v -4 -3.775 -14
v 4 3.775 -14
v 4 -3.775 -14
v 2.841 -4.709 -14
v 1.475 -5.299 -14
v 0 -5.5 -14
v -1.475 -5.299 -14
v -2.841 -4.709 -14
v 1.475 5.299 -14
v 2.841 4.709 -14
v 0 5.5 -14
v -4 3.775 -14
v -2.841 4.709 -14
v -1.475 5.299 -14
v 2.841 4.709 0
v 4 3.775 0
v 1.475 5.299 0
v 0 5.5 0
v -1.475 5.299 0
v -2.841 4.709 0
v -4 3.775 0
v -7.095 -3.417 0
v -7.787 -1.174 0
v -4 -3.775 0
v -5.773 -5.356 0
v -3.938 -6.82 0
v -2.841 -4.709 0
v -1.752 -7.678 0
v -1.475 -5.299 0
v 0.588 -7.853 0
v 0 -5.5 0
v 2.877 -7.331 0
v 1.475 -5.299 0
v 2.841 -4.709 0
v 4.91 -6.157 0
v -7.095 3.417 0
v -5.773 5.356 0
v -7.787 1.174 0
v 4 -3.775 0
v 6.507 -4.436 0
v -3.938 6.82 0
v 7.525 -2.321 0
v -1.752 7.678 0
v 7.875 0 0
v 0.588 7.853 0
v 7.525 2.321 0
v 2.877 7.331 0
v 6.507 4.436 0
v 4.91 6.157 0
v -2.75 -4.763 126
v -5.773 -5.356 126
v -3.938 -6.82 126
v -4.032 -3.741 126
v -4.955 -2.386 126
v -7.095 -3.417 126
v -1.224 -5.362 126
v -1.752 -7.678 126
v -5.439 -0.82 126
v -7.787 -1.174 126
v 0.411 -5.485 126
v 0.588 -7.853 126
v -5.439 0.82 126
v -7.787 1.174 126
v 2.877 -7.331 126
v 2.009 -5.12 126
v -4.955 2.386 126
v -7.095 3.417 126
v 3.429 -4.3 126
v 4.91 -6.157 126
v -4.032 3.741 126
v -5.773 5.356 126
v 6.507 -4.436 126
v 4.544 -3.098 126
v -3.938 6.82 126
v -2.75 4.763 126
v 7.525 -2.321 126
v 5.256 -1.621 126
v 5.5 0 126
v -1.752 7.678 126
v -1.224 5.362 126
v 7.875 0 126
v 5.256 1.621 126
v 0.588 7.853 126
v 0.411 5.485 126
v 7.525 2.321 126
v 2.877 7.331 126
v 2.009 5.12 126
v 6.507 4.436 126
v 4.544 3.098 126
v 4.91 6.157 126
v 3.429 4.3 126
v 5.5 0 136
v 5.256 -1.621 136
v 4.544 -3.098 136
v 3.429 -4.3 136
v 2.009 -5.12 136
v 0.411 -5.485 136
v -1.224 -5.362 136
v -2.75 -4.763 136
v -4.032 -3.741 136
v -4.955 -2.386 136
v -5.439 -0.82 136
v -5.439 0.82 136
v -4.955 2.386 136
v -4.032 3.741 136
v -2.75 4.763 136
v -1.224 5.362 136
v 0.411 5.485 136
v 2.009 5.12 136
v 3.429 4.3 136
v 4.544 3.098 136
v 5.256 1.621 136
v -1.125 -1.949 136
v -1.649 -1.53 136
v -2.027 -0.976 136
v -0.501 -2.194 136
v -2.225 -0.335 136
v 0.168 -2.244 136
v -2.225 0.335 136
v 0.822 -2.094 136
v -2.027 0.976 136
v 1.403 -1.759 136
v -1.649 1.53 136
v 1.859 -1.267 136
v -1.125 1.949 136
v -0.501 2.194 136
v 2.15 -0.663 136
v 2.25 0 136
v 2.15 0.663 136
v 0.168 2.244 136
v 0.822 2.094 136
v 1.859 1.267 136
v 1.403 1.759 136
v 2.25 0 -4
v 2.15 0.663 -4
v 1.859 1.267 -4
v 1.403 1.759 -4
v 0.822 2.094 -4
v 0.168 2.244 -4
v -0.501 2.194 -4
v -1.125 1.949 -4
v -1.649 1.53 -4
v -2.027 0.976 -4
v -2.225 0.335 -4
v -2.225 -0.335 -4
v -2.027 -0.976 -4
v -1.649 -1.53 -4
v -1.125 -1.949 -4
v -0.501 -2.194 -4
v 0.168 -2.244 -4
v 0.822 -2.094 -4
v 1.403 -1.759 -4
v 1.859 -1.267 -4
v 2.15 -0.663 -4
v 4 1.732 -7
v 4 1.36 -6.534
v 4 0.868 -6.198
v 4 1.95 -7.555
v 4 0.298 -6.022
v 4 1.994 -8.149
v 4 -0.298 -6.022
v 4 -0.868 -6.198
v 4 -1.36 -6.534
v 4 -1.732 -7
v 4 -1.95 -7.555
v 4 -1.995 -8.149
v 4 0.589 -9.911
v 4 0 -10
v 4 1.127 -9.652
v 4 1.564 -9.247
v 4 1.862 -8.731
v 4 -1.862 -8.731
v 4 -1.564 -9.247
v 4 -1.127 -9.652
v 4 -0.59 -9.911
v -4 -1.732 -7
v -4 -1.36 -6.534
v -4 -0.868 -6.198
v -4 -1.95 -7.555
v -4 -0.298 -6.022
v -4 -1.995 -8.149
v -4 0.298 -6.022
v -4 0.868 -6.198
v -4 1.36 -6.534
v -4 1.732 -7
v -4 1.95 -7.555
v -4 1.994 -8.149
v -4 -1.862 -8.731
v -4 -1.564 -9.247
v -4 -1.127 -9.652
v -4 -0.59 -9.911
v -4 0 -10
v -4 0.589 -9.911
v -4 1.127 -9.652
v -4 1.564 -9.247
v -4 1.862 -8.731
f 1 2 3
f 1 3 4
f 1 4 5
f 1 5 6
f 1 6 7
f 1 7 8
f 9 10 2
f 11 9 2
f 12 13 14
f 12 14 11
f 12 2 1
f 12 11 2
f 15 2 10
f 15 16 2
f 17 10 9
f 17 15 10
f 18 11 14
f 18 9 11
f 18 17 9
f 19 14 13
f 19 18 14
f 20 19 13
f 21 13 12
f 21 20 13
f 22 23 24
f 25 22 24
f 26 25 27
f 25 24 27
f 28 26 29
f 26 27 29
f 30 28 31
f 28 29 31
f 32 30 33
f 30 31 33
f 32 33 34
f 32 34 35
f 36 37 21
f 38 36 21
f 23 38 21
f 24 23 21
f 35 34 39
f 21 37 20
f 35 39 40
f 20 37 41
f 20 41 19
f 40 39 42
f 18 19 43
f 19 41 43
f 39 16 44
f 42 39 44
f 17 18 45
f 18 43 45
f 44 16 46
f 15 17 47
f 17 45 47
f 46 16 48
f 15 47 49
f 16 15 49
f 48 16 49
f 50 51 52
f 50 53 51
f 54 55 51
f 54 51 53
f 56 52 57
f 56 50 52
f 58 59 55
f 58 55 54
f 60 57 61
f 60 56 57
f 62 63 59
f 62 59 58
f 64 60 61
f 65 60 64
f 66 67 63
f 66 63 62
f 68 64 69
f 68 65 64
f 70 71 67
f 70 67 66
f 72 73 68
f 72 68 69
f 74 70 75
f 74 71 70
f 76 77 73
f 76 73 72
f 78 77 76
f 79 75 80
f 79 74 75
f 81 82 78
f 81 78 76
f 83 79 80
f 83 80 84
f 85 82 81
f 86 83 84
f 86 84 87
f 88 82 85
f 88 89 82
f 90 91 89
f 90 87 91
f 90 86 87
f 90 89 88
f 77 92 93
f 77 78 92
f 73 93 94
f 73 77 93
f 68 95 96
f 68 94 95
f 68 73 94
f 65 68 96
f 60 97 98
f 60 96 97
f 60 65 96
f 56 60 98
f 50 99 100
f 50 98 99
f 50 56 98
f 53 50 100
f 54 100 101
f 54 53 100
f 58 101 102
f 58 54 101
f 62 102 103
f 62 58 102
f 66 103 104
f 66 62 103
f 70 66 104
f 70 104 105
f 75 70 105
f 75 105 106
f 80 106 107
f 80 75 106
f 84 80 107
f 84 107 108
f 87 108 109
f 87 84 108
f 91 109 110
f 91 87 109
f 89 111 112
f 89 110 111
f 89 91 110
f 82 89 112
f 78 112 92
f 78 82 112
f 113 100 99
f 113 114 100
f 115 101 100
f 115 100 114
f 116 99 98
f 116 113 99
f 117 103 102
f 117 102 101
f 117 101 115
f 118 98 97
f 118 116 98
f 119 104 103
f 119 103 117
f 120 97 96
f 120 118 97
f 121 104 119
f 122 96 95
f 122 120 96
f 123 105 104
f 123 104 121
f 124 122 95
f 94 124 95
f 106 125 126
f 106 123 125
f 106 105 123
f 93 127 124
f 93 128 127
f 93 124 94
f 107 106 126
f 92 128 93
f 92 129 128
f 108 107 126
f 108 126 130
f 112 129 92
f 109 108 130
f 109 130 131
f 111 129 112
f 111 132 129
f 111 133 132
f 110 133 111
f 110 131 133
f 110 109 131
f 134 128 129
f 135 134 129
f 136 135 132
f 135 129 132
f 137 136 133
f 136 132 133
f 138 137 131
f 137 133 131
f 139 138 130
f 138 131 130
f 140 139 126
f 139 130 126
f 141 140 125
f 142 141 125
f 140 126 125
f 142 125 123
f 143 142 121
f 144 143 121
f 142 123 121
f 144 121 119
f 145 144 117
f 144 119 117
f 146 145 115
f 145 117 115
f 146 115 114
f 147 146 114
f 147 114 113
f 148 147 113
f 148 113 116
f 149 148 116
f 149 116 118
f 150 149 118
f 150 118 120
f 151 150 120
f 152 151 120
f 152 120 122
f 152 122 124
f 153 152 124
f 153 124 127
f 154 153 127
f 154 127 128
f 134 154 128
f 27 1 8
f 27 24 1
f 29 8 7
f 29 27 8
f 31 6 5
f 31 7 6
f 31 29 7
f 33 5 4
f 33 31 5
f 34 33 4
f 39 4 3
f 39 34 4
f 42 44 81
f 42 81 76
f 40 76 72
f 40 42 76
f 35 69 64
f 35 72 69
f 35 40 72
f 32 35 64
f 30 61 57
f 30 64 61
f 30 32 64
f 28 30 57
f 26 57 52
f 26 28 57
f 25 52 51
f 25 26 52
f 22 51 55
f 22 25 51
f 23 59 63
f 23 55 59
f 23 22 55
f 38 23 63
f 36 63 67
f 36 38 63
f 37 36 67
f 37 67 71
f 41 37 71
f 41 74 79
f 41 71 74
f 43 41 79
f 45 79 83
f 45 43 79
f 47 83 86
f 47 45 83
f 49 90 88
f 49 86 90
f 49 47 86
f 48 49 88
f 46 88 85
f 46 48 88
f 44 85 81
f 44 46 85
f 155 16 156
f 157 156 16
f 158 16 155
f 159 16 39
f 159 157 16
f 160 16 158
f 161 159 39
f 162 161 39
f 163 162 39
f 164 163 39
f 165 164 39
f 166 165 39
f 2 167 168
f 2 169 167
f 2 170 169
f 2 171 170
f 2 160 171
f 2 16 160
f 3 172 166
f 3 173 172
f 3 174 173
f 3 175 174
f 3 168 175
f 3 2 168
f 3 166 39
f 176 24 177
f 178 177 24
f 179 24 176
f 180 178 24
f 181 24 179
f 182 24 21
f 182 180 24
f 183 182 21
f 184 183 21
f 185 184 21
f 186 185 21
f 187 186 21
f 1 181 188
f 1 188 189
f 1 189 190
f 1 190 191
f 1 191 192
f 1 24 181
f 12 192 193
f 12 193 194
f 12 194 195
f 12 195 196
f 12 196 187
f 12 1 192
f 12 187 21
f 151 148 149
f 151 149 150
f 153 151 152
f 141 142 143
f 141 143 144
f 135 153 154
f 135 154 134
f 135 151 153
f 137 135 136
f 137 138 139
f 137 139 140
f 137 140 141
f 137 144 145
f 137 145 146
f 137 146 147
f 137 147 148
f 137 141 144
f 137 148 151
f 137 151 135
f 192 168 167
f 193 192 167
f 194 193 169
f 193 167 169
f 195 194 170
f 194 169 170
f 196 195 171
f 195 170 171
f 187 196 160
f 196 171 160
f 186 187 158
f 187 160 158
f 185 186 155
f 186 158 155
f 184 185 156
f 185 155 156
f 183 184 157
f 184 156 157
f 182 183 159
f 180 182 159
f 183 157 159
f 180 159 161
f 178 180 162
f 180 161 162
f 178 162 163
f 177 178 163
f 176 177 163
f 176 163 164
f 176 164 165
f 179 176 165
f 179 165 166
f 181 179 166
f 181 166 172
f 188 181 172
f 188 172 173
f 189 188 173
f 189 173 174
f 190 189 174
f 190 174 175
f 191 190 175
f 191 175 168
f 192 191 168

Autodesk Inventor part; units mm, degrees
ref_plane "YZ Plane" through (0, 0, 0) normal (1, 0, 0) x (0, 1, 0)
ref_plane "XZ Plane" through (0, 0, 0) normal (0, 1, 0) x (-1, 0, 0)
ref_plane "XY Plane" through (0, 0, 0) normal (0, 0, 1) x (1, 0, 0)
sketch "Sketch1" plane through (0, 0, 0) normal (0, 0, 1) x (1, 0, 0)
  circle A0 centre (0, 0) radius 7.875
  dimension "d0" = 15.75
extrude "Extrusion1" add sketch "Sketch1" along normal blind 126
sketch "Sketch2" plane through (0, 0, 126) normal (0, 0, 1) x (1, 0, 0)
  circle A0 centre (0, 0) radius 5.5
  dimension "d3" = 11
extrude "Extrusion2" add sketch "Sketch2" along normal blind 10
sketch "Sketch3" plane through (0, 0, 0) normal (0, 0, -1) x (-1, 0, 0)
  circle A0 centre (0, 0) radius 5.5
  dimension "d6" = 11
extrude "Extrusion3" add sketch "Sketch3" along normal blind 14
sketch "Sketch4" plane through (0, 0, -14) normal (0, 0, -1) x (-1, 0, 0)
  line L0 (4, 13.3221) -> (11.8644, 13.3221)
  line L1 (11.8644, 13.3221) -> (11.8644, -10.8813)
  line L2 (11.8644, -10.8813) -> (4, -10.8813)
  line L3 (4, -10.8813) -> (4, 13.3221)
  line L4 (-11.0508, 13.3221) -> (-4, 13.3221)
  line L5 (-4, 13.3221) -> (-4, -10.8813)
  line L6 (-4, -10.8813) -> (-11.0508, -10.8813)
  line L7 (-11.0508, -10.8813) -> (-11.0508, 13.3221)
  point P0 (0, 0)
  dimension "d9" = 8
  dimension "d10" = 4
extrude "Extrusion4" cut sketch "Sketch4" against normal up to surface (14 mm away)
sketch "Sketch5" plane through (4, -3.7749, -14) normal (1, 0, 0) x (0, 0, -1)
  circle A0 centre (-6, 3.7748) radius 2
  line L0 (0, 7.5498) -> (0, 0) projected
  line L1 (-14, 7.5498) -> (0, 7.5498) projected
  point P0 (-14, 3.7749)
  dimension "d13" = 4
  dimension "d14" = 6
  dimension "d15" = 3.775
extrude "Extrusion5" cut sketch "Sketch5" against normal up to next
sketch "Sketch7" plane through (0, 0, 136) normal (0, 0, 1) x (1, 0, 0)
  circle A0 centre (0, 0) radius 2.25
  dimension "d21" = 4.5
extrude "Extrusion7" cut sketch "Sketch7" against normal blind 140
properties part number "Small_piston" material "Aluminum 6061-AHC"
